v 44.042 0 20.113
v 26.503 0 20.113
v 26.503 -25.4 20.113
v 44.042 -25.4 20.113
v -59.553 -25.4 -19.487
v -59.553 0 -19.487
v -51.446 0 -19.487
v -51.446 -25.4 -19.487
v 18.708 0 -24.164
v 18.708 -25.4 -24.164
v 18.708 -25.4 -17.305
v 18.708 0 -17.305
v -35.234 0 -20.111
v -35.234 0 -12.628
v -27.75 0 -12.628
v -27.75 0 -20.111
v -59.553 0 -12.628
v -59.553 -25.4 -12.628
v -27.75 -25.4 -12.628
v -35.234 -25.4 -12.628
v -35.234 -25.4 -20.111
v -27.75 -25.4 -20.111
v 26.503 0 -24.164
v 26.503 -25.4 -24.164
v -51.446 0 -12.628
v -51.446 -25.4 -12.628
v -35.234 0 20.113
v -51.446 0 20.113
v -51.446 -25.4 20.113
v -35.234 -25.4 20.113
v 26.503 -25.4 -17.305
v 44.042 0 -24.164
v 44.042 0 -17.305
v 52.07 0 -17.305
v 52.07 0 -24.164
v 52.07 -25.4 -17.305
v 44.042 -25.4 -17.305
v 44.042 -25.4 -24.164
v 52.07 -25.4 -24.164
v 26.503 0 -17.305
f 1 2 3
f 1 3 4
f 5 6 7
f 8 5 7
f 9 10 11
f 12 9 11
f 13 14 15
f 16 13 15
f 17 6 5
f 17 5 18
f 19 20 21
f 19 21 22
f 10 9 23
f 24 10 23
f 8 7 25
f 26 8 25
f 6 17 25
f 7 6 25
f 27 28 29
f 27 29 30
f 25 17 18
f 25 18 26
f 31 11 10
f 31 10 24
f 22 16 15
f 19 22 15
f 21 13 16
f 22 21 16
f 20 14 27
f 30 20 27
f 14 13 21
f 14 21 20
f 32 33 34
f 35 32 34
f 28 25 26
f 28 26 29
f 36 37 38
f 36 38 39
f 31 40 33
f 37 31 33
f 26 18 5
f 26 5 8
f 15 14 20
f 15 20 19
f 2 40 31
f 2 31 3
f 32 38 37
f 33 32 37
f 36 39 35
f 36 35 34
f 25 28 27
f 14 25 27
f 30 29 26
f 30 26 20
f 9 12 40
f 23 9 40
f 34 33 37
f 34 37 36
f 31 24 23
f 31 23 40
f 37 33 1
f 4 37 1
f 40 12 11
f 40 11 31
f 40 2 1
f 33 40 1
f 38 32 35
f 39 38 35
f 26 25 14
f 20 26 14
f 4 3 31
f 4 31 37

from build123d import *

# Parameters (mm, degrees)
F0_W     = 16.212426126
F0_H     = 32.7403051779
F1_DEPTH = 25.4
F0_W_2   = 8.1066712737
F0_H_2   = 6.8594915792
F0_W_3   = 7.4840001762
F0_H_3   = 7.4830828235
F0_W_4   = 7.7948775142
F0_H_4   = 6.8594925106
F0_W_5   = 8.0275759101
F0_W_6   = 17.5396222621
F0_H_5   = 37.4172311276


with BuildPart() as f1:
    # F0 (on Front) → F1 (new body)
    with BuildSketch(Plane.XZ):
        with Locations((-43.3399751782, 3.7424531765)):
            Rectangle(F0_W, F0_H)
    extrude(amount=F1_DEPTH)


with BuildPart() as f1b:
    # F0 (on Front) → F1, piece 2 (new body)
    with BuildSketch(Plane.XZ):
        with Locations((-55.4995238781, -16.057445202)):
            Rectangle(F0_W_2, F0_H_2)
    extrude(amount=F1_DEPTH)


with BuildPart() as f1c:
    # F0 (on Front) → F1, piece 3 (new body)
    with BuildSketch(Plane.XZ):
        with Locations((-31.4917620271, -16.3692408241)):
            Rectangle(F0_W_3, F0_H_3)
    extrude(amount=F1_DEPTH)


with BuildPart() as f1d:
    # F0 (on Front) → F1, piece 4 (new body)
    with BuildSketch(Plane.XZ):
        with Locations((22.6051425561, -20.7343716174)):
            Rectangle(F0_W_4, F0_H_4)
    extrude(amount=F1_DEPTH)


with BuildPart() as f1e:
    # F0 (on Front) → F1, piece 5 (new body)
    with BuildSketch(Plane.XZ):
        with Locations((48.0559915304, -20.7343716174)):
            Rectangle(F0_W_5, F0_H_4)
    extrude(amount=F1_DEPTH)


with BuildPart() as f1f:
    # F0 (on Front) → F1, piece 6 (new body)
    with BuildSketch(Plane.XZ):
        with Locations((35.2723924443, 1.4039902017)):
            Rectangle(F0_W_6, F0_H_5)
    extrude(amount=F1_DEPTH)


solid = Compound([f1.part, f1b.part, f1c.part, f1d.part, f1e.part, f1f.part])
